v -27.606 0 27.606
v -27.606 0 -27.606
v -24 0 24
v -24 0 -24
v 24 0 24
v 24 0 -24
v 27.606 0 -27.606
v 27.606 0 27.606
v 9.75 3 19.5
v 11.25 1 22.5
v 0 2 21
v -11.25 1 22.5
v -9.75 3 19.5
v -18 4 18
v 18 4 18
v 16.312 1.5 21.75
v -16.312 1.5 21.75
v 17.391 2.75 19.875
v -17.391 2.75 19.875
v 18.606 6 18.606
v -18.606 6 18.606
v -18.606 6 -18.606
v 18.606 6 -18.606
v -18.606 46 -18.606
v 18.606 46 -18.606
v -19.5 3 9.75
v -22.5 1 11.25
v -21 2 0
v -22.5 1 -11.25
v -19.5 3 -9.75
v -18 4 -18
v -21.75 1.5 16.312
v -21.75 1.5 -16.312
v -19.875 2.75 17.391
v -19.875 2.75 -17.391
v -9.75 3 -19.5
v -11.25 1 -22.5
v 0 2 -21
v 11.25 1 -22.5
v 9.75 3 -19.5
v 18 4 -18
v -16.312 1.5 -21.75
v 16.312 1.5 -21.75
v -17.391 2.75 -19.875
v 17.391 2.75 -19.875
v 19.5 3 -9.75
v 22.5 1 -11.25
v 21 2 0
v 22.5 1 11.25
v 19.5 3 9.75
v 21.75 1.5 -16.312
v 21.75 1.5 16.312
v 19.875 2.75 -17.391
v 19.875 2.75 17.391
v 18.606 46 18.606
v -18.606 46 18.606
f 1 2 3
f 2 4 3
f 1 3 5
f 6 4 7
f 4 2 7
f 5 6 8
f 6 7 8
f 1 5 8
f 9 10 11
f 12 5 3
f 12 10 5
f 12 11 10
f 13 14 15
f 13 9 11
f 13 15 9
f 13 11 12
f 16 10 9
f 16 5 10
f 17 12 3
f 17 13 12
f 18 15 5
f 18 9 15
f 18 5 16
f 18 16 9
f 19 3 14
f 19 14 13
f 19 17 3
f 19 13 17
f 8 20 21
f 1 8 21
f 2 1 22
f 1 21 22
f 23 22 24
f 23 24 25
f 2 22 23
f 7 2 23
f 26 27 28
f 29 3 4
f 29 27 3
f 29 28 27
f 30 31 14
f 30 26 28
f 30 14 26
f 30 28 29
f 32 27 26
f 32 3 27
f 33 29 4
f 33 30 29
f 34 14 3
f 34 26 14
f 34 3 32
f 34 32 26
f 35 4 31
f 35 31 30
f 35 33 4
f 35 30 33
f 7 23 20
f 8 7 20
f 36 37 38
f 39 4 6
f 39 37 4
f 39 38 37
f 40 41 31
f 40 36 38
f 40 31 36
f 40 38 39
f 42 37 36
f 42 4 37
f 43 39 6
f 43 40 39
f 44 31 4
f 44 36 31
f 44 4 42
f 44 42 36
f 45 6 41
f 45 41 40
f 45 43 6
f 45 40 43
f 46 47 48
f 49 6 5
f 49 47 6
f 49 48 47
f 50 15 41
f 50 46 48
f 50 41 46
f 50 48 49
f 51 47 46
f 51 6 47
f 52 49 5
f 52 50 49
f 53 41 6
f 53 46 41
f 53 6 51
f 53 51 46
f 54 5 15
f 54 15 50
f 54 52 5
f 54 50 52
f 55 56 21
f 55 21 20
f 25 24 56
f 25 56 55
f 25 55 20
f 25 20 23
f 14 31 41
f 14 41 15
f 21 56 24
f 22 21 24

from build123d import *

# Parameters (mm, degrees)
SHELL4_T            = 2
SKETCH8_W           = 37.21110255
SKETCH8_H           = 37.21110255
BOSS_EXTRUDE1_DEPTH = 40


with BuildPart() as part:
    # Sketch1 → Loft1 section 0
    with BuildSketch(Plane(origin=(0, 0, 0), x_dir=(1, 0, 0), z_dir=(0, 1, 0))):
        with BuildLine():
            Line((-24, 24), (24, 24))
            Line((24, 24), (24, -24))
            Line((24, -24), (-24, -24))
            Line((-24, -24), (-24, 24))
        make_face()
    # Sketch2 → Loft1 section 1
    with BuildSketch(Plane(origin=(0, 4, 0), x_dir=(1, 0, 0), z_dir=(0, 1, 0))):
        with BuildLine():
            Line((-18, 18), (18, 18))
            Line((18, 18), (18, -18))
            Line((18, -18), (-18, -18))
            Line((-18, -18), (-18, 18))
        make_face()
    loft()

    # Shell4
    shell4_openings = [part.faces().sort_by_distance(p)[0] for p in [
        (0, 0, 0),
    ]]
    offset(amount=SHELL4_T, openings=shell4_openings, kind=Kind.INTERSECTION)

    # Sketch8 → Boss-Extrude1 (add)
    with BuildSketch(Plane(origin=(0, 6, 0), x_dir=(1, 0, 0), z_dir=(0, 1, 0))):
        Rectangle(SKETCH8_W, SKETCH8_H)
    extrude(amount=BOSS_EXTRUDE1_DEPTH)


solid = part.part
